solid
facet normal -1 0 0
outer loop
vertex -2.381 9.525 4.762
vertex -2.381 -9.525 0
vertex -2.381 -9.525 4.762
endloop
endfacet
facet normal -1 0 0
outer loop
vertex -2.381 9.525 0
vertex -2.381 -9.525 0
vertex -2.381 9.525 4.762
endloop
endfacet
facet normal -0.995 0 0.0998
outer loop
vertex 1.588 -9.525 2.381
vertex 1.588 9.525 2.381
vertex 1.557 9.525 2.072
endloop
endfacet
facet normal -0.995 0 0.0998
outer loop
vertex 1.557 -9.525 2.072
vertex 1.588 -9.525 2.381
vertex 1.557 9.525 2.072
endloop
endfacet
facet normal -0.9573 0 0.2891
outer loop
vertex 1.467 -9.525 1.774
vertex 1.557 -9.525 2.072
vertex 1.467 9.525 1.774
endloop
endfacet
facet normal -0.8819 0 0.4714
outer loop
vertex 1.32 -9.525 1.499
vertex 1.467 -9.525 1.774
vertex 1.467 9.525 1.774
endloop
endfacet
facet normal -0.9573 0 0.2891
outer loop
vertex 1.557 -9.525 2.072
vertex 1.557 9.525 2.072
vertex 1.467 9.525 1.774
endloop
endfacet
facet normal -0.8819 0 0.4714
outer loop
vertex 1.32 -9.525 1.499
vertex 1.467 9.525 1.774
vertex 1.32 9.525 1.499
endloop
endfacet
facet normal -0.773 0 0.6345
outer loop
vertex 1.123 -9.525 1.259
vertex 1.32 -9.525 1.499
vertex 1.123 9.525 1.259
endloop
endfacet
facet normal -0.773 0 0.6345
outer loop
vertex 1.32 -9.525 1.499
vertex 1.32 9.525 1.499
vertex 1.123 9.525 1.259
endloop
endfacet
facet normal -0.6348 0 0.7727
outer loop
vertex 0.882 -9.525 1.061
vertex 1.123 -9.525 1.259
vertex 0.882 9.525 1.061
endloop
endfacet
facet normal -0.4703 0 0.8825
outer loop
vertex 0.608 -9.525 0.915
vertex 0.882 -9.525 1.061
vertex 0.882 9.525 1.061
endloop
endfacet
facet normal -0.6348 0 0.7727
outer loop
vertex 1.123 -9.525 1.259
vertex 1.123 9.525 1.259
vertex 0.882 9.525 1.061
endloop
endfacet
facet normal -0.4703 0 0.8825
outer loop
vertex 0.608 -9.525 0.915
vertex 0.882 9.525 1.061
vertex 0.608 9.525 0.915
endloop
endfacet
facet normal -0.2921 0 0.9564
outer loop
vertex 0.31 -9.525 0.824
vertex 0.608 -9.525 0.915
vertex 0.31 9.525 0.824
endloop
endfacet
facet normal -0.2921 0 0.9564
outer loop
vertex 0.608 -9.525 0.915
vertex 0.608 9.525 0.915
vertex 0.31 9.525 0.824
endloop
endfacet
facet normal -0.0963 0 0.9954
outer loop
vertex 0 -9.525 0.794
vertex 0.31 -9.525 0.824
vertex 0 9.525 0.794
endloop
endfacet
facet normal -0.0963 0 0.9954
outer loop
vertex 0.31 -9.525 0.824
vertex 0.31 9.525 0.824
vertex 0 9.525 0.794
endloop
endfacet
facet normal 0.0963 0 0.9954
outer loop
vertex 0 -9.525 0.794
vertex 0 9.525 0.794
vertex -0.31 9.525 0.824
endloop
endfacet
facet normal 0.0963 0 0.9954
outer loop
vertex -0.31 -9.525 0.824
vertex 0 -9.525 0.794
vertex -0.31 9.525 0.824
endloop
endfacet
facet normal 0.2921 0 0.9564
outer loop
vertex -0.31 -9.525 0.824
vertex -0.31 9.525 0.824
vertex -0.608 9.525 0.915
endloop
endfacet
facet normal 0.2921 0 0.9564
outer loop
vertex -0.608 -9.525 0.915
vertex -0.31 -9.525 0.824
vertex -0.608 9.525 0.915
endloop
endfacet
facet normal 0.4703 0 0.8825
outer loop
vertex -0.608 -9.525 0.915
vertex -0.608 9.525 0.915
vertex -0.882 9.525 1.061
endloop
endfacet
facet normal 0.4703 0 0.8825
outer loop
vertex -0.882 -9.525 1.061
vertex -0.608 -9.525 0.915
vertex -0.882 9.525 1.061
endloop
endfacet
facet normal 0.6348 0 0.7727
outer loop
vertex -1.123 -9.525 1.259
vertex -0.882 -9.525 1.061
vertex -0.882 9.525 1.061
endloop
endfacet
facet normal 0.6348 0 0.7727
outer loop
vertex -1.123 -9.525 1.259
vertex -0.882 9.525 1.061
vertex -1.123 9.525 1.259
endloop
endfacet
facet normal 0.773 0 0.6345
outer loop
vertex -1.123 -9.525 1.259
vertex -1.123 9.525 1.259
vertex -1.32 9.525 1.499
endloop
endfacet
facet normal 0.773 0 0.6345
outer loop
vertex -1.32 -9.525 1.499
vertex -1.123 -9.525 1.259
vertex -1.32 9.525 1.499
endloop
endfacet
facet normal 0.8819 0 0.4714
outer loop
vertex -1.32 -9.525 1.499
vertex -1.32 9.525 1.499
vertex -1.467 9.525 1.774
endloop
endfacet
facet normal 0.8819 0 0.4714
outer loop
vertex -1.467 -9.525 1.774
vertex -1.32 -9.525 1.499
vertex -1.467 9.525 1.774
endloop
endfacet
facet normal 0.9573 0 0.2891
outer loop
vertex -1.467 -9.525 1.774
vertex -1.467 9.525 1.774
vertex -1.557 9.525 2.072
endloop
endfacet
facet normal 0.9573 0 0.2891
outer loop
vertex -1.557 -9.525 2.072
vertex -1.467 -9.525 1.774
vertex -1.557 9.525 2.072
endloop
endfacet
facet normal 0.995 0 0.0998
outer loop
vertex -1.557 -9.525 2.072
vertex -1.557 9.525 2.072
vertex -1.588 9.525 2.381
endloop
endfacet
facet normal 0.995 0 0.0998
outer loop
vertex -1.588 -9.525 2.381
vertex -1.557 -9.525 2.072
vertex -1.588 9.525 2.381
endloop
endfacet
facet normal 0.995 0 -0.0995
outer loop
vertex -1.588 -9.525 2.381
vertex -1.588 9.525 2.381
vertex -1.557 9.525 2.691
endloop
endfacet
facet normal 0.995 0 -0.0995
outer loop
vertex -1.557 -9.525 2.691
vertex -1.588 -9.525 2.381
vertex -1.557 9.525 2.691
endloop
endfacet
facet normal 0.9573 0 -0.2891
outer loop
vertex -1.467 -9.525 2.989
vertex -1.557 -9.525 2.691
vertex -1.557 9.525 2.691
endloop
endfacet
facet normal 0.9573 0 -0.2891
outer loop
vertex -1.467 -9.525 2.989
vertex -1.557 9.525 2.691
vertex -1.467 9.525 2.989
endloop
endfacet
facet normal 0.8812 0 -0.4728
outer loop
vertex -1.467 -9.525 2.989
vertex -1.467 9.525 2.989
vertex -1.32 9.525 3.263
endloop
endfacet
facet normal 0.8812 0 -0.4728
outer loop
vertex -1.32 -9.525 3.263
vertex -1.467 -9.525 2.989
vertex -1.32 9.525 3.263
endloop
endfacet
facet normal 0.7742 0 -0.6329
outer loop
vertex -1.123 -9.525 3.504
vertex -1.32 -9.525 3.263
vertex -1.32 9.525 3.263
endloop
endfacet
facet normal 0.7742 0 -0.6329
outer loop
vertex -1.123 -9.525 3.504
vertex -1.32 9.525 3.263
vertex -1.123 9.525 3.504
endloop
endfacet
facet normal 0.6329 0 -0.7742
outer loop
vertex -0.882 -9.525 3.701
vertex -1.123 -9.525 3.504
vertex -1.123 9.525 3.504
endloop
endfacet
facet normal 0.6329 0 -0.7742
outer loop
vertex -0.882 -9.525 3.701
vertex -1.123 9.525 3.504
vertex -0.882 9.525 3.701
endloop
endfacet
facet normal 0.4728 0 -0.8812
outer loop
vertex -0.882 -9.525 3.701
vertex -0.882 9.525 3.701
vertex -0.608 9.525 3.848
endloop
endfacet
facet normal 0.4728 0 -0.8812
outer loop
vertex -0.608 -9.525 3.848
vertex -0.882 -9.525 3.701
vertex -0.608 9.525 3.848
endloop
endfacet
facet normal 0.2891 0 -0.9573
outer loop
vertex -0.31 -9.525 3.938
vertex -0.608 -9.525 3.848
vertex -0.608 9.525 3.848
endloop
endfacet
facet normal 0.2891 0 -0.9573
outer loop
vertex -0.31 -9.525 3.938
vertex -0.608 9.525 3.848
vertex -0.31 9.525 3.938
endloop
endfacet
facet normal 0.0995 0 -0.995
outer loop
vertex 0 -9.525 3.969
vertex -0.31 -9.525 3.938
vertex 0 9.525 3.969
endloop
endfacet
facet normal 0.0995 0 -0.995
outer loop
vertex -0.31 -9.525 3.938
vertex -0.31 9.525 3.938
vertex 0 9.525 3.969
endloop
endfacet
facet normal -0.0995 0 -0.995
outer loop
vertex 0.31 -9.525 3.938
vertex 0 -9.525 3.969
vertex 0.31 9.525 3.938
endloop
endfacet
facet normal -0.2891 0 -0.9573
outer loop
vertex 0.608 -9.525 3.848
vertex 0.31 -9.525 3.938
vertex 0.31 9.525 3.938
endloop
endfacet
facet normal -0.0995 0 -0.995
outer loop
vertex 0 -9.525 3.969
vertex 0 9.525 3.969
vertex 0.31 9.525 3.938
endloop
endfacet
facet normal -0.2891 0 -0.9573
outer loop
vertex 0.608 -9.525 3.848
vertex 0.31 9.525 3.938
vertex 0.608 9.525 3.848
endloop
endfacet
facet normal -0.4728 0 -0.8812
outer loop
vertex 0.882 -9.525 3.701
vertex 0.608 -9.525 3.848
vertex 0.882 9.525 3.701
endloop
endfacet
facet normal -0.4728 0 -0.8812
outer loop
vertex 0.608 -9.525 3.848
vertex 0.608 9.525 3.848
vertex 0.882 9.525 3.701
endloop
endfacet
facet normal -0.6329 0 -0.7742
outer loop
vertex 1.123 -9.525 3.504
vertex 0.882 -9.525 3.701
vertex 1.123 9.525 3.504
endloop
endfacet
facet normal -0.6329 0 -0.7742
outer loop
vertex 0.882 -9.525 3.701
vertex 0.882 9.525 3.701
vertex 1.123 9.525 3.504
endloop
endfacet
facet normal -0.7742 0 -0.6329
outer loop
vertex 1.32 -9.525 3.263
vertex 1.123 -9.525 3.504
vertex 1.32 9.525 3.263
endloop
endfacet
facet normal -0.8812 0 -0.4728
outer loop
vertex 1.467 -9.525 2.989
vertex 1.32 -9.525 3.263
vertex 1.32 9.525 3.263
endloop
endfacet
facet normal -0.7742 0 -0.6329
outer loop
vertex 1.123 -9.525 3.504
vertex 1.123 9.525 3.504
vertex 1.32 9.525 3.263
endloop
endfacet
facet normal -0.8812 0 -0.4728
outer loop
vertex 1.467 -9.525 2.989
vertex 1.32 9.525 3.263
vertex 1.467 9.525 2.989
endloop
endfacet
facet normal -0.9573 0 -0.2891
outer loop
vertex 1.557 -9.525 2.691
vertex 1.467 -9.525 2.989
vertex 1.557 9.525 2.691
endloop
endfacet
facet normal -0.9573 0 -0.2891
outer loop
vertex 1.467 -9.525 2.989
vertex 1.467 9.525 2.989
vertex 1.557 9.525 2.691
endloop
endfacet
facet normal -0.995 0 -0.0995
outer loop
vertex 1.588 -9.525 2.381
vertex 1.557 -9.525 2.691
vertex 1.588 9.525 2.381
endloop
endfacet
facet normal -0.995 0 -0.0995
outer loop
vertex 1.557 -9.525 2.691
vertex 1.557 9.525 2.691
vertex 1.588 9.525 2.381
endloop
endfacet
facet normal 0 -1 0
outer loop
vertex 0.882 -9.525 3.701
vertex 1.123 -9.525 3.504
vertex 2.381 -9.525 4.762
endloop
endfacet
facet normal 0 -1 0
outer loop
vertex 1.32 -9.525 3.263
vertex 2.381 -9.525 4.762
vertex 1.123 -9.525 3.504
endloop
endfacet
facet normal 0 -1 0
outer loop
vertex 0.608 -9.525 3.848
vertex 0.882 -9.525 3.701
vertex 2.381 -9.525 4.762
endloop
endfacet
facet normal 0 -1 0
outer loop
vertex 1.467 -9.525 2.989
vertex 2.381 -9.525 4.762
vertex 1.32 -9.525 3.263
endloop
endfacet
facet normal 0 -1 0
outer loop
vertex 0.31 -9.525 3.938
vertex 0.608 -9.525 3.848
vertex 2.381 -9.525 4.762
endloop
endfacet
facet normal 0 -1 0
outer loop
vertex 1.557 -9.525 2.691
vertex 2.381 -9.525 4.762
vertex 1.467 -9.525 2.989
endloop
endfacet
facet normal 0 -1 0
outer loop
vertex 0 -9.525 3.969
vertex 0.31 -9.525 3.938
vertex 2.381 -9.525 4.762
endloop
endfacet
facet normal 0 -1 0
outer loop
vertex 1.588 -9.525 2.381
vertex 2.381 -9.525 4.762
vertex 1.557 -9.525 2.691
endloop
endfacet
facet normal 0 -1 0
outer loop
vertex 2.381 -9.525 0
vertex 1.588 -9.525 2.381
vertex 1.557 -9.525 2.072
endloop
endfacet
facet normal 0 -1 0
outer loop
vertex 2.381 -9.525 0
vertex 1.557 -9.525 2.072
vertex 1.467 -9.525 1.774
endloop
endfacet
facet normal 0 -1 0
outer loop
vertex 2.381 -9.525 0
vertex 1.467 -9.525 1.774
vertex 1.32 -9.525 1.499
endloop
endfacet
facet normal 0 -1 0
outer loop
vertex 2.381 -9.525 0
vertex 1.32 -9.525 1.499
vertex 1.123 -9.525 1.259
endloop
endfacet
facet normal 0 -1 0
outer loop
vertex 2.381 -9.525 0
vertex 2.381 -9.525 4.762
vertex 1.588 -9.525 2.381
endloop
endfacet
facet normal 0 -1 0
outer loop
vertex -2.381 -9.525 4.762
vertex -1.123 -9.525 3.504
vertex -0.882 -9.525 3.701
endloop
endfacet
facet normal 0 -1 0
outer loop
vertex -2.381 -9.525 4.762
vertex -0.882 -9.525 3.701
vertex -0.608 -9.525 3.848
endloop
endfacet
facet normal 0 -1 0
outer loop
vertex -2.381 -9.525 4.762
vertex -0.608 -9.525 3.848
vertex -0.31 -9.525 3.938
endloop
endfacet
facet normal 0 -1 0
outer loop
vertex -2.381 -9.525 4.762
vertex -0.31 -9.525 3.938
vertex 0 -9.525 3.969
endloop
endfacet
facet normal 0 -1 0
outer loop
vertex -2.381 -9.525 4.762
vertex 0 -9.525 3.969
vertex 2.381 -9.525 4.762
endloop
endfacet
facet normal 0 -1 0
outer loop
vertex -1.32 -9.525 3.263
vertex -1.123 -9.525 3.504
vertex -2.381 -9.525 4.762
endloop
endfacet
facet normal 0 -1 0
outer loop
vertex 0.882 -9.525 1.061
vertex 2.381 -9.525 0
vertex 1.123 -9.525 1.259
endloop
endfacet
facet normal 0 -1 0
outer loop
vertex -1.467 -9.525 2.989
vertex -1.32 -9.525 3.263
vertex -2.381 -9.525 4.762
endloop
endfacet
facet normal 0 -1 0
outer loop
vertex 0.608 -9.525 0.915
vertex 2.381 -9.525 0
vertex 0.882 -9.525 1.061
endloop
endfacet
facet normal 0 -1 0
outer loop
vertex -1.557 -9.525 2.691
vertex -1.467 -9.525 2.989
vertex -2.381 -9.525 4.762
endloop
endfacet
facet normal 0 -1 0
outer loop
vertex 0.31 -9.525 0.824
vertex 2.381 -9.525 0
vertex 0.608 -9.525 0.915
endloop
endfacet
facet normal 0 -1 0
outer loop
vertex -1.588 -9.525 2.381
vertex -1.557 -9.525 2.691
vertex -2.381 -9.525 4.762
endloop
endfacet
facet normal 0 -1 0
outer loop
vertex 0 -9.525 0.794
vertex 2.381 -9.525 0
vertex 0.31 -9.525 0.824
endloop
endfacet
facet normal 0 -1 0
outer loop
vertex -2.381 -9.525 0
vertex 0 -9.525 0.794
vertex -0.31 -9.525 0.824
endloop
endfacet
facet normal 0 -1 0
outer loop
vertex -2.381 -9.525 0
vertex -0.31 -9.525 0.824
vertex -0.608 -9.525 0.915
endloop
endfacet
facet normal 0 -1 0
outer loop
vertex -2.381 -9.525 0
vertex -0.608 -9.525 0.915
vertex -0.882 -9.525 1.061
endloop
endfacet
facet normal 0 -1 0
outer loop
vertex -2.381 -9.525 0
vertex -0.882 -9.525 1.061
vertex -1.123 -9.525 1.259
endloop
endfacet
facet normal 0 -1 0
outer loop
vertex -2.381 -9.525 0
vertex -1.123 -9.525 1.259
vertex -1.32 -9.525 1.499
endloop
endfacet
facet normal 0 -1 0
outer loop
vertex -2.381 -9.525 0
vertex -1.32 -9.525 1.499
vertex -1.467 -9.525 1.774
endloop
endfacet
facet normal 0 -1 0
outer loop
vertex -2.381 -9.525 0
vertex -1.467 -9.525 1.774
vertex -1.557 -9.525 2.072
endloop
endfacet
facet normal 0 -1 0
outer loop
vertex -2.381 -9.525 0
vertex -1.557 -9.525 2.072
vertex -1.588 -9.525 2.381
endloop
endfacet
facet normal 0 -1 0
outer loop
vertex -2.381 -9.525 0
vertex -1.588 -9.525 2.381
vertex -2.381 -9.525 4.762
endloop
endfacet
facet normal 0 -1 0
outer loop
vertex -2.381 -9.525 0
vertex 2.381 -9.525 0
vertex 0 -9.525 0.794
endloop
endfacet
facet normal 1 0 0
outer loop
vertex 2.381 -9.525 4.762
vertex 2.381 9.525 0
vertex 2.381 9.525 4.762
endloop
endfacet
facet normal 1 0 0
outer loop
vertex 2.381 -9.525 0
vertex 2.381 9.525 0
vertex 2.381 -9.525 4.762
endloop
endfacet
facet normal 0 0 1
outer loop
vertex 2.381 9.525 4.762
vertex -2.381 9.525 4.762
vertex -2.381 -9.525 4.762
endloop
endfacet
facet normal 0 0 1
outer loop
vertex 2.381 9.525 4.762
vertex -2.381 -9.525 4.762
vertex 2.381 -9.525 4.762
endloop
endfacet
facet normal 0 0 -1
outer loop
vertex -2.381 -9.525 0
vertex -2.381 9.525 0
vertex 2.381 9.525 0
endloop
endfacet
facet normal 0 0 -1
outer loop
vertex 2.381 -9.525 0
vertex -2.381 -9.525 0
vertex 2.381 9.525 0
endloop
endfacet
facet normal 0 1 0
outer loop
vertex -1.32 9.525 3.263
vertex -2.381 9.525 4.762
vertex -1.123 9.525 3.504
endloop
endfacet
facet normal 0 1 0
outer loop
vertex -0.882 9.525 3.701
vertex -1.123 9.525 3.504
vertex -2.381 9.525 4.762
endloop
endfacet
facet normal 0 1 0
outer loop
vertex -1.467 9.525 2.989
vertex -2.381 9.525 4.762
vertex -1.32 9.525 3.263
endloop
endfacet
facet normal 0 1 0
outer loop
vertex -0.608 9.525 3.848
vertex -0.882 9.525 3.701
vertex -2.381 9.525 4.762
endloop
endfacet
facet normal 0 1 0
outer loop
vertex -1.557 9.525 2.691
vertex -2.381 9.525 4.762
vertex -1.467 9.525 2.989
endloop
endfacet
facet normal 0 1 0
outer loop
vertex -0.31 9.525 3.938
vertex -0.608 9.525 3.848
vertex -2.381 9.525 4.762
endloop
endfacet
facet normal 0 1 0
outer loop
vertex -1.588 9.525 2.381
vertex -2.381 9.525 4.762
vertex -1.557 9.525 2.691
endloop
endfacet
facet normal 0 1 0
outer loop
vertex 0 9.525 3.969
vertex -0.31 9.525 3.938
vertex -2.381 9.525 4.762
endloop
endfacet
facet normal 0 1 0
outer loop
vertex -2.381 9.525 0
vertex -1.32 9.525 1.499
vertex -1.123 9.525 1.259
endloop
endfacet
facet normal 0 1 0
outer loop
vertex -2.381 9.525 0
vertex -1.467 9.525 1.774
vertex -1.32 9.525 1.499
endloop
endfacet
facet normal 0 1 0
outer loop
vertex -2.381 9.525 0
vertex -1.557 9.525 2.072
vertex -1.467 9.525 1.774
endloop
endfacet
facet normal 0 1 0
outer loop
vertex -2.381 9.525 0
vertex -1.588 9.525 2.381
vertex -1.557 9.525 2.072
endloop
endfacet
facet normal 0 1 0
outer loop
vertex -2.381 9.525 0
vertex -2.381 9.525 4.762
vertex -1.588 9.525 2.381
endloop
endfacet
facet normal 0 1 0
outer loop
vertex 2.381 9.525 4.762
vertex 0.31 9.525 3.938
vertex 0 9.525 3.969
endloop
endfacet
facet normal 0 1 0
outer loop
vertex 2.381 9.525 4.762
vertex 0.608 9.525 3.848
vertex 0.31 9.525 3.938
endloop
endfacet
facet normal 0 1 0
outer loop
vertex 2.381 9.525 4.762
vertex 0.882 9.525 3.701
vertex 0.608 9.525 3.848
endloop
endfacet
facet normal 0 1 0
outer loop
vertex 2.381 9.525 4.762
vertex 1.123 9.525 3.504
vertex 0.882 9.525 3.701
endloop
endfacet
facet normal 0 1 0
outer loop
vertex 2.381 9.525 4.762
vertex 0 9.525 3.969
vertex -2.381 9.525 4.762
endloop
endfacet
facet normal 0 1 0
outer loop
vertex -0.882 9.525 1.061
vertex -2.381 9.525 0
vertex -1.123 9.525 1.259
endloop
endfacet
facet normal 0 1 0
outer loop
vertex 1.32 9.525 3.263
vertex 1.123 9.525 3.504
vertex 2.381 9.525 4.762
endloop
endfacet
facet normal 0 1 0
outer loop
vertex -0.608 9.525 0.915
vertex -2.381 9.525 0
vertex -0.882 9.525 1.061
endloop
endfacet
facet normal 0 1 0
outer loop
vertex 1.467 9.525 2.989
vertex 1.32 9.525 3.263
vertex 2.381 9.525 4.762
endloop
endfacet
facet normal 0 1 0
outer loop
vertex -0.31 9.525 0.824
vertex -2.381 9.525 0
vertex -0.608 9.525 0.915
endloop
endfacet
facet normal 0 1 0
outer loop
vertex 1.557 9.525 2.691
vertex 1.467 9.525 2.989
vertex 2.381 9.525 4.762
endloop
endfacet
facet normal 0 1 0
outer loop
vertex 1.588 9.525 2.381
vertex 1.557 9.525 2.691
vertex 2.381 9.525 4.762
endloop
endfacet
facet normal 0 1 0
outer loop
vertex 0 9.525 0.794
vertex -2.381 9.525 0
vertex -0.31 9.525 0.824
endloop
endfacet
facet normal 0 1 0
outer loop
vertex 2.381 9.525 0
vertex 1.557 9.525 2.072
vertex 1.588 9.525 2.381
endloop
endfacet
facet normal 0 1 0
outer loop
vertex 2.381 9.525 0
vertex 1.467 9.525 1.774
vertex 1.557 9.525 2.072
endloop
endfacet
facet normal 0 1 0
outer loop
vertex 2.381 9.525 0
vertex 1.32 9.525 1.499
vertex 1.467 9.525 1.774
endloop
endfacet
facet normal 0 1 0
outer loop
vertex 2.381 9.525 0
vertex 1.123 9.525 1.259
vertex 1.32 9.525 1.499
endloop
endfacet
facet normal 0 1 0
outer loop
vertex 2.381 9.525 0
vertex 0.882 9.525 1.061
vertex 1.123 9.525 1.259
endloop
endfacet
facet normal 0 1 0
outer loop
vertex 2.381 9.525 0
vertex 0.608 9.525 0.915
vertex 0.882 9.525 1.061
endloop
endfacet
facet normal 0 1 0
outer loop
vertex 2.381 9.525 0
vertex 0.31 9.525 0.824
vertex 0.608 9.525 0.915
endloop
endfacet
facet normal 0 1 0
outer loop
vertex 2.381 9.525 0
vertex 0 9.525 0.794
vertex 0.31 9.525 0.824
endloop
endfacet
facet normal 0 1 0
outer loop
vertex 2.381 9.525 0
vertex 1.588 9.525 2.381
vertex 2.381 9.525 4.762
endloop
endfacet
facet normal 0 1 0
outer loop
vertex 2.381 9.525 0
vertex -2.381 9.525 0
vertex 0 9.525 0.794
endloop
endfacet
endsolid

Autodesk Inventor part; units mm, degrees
ref_plane "YZ Plane" through (0, 0, 0) normal (1, 0, 0) x (0, 1, 0)
ref_plane "XZ Plane" through (0, 0, 0) normal (0, 1, 0) x (-1, 0, 0)
ref_plane "XY Plane" through (0, 0, 0) normal (0, 0, 1) x (1, 0, 0)
sketch "Sketch1" plane through (0, 0, 0) normal (0, 0, 1) x (1, 0, 0)
  line L0 (-2.3813, 9.525) -> (2.3813, 9.525)
  line L1 (2.3813, 9.525) -> (2.3813, -9.525)
  line L2 (2.3813, -9.525) -> (-2.3813, -9.525)
  line L3 (-2.3813, -9.525) -> (-2.3813, 9.525)
  point P0 (0, 0)
  point P1 (2.3813, 0)
  point P2 (0, 9.525)
  dimension "d0" = 4.7625
  dimension "d1" = 19.05
extrude "Extrusion1" add sketch "Sketch1" along normal blind 4.7625
sketch "Sketch2" plane through (-2.3813, 9.525, 0) normal (0, 1, 0) x (1, 0, 0)
  circle A0 centre (2.3813, -2.3813) radius 1.5875
  line L0 (0, 0) -> (0, -4.7625) projected
  line L1 (4.7625, -4.7625) -> (0, -4.7625) projected
  line L2 (4.7625, 0) -> (0, 0) projected
  line L3 (4.7625, 0) -> (4.7625, -4.7625) projected
  point P0 (2.3813, 0)
  dimension "d4" = 3.175
  dimension "d9" = 2.3813
  dimension "d10" = 2.3813
extrude "Extrusion2" cut sketch "Sketch2" against normal through all contours A0
properties part number "ArduinoStilts"
